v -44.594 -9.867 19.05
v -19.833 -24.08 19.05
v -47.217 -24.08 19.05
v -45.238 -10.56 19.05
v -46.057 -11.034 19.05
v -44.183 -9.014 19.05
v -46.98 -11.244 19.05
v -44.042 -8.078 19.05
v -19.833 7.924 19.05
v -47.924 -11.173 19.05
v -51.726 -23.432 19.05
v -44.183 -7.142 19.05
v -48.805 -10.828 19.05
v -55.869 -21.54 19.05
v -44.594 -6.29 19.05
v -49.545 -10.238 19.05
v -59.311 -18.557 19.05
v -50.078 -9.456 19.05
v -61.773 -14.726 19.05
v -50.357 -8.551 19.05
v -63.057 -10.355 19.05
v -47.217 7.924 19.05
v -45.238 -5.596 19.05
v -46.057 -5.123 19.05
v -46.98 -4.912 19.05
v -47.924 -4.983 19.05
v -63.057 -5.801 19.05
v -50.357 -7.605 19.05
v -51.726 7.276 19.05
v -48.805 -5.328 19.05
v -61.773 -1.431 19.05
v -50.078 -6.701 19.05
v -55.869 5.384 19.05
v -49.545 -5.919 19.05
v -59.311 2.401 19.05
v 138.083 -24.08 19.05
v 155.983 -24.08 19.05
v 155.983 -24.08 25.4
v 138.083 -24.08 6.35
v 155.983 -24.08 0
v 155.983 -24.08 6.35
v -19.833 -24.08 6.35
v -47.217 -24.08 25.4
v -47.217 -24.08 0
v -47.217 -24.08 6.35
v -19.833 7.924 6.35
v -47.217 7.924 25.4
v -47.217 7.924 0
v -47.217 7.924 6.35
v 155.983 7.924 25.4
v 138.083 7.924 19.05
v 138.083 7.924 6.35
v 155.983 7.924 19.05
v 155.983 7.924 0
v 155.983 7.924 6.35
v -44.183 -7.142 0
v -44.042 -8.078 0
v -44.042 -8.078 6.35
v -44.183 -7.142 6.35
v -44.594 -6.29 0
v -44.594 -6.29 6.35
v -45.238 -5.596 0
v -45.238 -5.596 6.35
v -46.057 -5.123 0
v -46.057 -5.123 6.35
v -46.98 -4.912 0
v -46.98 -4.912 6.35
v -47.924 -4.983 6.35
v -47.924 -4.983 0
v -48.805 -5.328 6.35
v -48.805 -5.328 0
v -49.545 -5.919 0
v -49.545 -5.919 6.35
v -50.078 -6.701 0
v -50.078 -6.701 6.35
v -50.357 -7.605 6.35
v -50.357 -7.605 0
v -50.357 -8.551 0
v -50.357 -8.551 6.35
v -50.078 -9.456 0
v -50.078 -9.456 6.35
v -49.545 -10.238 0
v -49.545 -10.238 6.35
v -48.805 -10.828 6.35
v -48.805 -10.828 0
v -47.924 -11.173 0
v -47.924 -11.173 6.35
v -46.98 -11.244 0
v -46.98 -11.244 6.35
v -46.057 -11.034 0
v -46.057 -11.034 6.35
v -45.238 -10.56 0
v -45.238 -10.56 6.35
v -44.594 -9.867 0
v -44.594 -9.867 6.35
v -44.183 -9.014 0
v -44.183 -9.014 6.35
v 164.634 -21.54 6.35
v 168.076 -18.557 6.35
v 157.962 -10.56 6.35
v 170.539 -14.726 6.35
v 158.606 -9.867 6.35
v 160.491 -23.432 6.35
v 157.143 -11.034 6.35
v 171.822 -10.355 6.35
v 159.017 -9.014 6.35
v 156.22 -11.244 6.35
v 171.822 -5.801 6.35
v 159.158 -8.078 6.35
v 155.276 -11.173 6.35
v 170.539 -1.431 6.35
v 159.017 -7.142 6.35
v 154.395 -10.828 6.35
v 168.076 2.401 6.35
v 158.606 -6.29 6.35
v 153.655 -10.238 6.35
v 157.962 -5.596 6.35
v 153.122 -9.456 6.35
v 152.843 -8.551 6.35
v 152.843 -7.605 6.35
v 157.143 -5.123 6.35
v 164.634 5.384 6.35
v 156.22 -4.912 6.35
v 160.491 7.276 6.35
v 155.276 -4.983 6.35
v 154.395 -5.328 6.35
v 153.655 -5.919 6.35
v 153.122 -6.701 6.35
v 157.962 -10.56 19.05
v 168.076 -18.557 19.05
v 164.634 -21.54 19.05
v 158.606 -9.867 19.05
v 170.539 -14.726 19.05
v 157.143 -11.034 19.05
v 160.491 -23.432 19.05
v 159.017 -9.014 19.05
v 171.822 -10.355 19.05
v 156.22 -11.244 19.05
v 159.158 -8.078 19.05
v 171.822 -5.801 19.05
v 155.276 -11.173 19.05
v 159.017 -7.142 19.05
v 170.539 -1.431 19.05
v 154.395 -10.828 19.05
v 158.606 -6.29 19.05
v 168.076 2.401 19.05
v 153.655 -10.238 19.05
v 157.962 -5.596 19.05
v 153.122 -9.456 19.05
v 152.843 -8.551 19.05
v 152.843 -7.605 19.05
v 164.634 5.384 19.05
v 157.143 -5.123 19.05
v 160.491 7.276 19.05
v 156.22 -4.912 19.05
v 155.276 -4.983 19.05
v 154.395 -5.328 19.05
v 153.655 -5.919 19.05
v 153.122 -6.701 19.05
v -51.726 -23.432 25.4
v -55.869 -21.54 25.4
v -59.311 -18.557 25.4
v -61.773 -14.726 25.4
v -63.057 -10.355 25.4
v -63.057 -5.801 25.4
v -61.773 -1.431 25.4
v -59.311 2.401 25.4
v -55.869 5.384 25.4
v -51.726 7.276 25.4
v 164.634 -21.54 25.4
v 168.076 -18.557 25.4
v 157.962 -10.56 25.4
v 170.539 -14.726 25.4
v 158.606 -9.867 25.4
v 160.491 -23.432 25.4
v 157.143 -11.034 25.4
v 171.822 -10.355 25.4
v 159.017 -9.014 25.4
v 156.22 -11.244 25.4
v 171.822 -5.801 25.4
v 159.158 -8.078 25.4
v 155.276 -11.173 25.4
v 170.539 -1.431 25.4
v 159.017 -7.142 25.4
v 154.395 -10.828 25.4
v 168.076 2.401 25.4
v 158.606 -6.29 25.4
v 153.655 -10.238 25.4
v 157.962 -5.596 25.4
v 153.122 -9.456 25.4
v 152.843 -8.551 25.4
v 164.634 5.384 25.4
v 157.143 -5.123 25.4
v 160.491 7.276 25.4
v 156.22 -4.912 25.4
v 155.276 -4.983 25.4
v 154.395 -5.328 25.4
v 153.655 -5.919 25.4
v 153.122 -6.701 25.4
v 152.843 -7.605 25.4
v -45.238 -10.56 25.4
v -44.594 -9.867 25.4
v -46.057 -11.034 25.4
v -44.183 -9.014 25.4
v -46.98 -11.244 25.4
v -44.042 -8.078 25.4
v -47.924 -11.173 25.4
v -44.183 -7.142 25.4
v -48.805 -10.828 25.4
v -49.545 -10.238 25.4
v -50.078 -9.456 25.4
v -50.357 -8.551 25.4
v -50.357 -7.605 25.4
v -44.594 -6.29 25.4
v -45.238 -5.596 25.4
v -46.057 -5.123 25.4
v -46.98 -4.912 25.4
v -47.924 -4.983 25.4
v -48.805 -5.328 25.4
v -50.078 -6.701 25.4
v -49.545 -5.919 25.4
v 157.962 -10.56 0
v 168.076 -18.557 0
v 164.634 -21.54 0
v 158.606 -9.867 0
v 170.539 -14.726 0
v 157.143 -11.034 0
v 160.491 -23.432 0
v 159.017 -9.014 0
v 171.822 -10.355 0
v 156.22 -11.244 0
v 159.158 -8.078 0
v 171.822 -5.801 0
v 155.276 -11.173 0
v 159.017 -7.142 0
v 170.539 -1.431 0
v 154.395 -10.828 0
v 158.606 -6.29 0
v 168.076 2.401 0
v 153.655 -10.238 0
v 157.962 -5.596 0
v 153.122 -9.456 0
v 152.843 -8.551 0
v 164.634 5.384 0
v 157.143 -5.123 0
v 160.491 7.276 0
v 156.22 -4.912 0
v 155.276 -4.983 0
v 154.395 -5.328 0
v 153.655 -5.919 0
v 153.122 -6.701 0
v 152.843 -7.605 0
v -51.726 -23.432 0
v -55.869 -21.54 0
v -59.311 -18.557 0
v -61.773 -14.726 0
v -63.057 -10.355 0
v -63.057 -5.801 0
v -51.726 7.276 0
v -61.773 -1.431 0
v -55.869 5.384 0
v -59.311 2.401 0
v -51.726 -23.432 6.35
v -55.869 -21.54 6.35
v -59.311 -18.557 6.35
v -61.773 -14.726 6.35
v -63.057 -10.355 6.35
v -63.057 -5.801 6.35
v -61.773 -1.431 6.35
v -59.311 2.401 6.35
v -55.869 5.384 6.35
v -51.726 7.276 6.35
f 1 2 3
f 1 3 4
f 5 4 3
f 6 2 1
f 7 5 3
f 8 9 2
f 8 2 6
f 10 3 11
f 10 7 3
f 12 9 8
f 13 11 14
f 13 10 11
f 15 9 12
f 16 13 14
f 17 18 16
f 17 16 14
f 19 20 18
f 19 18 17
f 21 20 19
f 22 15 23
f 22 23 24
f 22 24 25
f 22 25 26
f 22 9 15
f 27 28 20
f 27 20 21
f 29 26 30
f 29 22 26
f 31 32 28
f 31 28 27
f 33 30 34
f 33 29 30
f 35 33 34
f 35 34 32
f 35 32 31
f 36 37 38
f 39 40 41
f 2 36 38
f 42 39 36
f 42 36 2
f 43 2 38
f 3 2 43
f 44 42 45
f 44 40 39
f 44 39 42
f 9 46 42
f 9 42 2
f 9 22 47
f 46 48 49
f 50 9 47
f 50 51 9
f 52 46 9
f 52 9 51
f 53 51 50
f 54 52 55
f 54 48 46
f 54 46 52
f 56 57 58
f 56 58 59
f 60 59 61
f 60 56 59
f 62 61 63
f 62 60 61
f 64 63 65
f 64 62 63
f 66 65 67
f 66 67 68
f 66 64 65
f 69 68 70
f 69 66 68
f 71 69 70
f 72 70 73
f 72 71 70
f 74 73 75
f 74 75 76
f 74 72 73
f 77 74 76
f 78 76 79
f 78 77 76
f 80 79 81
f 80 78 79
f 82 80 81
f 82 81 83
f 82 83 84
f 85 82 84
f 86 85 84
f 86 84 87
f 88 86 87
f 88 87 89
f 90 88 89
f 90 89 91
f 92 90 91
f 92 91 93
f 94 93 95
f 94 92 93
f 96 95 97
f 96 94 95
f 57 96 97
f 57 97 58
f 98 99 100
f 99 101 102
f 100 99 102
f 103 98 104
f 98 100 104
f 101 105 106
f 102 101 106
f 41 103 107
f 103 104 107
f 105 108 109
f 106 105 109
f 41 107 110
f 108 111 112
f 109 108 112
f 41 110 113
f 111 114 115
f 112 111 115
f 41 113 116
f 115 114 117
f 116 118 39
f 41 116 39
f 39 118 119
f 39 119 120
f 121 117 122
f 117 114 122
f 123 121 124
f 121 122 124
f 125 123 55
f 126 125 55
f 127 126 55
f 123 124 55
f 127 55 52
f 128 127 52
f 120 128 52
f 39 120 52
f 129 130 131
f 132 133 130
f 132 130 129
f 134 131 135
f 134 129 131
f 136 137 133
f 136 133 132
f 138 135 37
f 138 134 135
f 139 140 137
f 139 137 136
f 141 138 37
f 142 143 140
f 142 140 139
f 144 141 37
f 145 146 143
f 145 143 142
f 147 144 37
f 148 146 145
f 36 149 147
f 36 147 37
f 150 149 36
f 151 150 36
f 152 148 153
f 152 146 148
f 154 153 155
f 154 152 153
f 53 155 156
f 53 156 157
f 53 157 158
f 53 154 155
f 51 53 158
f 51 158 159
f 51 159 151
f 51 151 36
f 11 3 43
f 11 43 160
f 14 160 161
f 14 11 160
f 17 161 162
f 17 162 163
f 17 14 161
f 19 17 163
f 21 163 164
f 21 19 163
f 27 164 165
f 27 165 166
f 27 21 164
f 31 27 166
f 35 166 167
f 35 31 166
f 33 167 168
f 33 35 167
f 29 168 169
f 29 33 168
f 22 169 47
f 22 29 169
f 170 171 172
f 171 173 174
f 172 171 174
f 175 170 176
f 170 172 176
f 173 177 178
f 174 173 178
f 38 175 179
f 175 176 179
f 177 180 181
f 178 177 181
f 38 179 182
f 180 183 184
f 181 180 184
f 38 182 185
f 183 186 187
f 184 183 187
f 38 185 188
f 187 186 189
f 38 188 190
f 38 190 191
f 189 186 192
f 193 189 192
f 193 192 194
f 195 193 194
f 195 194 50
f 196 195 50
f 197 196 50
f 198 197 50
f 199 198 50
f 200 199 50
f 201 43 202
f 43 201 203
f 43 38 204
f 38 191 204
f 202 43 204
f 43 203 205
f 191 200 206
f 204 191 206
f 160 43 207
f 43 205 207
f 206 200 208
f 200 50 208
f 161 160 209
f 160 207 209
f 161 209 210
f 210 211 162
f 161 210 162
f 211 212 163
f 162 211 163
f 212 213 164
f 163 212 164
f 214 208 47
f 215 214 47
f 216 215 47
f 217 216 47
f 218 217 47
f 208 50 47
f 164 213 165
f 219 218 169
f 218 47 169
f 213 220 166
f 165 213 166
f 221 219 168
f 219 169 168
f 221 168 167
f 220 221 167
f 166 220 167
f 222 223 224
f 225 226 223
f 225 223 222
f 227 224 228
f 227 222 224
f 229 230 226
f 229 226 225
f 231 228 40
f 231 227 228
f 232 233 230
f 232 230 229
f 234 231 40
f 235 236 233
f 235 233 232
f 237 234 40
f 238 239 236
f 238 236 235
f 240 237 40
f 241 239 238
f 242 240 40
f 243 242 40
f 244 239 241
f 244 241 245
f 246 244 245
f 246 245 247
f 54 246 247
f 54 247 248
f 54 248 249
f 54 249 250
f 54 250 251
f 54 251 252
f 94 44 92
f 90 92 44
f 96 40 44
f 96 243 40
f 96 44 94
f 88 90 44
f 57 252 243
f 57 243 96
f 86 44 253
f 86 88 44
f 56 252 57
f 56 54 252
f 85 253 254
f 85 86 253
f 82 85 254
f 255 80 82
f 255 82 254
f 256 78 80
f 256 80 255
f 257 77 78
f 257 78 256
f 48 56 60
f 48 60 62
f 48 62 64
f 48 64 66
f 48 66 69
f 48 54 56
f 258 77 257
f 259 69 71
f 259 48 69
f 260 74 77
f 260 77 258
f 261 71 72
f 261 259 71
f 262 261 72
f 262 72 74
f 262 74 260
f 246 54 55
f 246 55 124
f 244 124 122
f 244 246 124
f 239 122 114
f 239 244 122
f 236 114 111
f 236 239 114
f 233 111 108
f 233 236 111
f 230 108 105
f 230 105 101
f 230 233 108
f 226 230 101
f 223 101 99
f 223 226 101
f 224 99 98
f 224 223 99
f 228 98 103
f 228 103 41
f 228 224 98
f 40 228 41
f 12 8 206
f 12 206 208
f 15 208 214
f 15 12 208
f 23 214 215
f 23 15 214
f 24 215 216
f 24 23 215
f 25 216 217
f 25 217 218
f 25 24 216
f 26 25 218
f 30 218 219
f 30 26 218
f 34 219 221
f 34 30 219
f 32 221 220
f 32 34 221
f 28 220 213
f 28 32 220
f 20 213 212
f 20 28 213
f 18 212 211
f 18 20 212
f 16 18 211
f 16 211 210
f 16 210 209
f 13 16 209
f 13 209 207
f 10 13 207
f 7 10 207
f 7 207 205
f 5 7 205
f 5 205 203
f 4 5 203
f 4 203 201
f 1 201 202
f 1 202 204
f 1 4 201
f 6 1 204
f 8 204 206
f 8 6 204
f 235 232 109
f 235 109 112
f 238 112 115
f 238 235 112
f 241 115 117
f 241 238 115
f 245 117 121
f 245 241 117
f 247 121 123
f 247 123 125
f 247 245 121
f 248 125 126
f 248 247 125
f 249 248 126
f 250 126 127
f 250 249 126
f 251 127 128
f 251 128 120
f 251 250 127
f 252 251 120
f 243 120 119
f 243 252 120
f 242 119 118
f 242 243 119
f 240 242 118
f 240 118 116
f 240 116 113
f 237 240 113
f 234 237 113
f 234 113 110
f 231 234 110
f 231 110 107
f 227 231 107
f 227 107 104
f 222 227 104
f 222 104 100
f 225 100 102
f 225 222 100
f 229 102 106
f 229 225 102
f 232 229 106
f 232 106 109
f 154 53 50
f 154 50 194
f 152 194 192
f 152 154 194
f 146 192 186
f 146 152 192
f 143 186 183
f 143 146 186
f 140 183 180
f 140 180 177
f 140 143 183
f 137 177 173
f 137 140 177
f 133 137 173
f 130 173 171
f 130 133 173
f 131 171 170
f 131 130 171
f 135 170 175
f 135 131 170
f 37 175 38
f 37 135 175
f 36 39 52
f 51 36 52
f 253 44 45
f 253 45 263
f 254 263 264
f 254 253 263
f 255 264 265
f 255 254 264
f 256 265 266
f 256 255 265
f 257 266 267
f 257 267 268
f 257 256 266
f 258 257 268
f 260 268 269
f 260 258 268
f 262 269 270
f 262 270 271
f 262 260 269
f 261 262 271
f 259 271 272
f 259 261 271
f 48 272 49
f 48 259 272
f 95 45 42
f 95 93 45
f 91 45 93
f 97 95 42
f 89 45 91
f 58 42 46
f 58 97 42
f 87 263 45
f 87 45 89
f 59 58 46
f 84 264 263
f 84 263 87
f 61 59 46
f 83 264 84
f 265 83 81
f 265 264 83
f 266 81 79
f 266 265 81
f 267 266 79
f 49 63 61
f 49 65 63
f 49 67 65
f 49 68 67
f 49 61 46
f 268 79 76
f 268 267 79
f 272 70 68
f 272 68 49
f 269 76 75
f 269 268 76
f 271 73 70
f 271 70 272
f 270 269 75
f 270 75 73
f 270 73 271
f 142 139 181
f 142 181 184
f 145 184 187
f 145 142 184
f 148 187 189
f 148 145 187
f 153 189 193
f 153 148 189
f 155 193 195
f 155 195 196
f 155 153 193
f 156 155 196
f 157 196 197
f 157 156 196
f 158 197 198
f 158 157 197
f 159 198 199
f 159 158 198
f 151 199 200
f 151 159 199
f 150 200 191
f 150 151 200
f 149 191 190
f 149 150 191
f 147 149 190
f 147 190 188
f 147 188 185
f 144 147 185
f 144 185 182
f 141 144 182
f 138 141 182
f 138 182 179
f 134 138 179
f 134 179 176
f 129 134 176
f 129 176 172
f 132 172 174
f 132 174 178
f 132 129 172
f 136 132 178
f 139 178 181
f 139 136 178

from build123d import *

# Parameters (mm, degrees)
SKETCH1_R           = 3.175
BOSS_EXTRUDE1_DEPTH = 6.35
SKETCH2_W           = 168.075192403
SKETCH2_H           = 32.004
BOSS_EXTRUDE2_DEPTH = 12.7
SKETCH5_R           = 3.175
BOSS_EXTRUDE3_DEPTH = 6.35
SKETCH7_W           = 12.7
SKETCH7_H           = 32.004
CUT_EXTRUDE1_DEPTH  = 10.16


with BuildPart() as part:
    # Sketch1 → Boss-Extrude1 (new body)
    with BuildSketch(Plane.XY):
        with BuildLine():
            Line((-47.217391304, 7.923913043), (155.982608696, 7.923913043))
            ThreePointArc((155.982608696, 7.923913043), (171.984608696, -8.078086957), (155.982608696, -24.080086957))
            Line((155.982608696, -24.080086957), (-47.217391304, -24.080086957))
            ThreePointArc((-47.217391304, -24.080086957), (-63.219391304, -8.078086957), (-47.217391304, 7.923913043))
        make_face()
        with Locations((-47.217391304, -8.078086957)):
            Circle(SKETCH1_R, mode=Mode.SUBTRACT)
        with Locations((155.982608696, -8.078086957)):
            Circle(SKETCH1_R, mode=Mode.SUBTRACT)
    extrude(amount=BOSS_EXTRUDE1_DEPTH)

    # Sketch2 → Boss-Extrude2 (add)
    with BuildSketch(Plane.XY.offset(6.35)):
        with Locations((54.045012495, -8.078086957)):
            Rectangle(SKETCH2_W, SKETCH2_H)
    extrude(amount=BOSS_EXTRUDE2_DEPTH)

    # Sketch5 → Boss-Extrude3 (add)
    with BuildSketch(Plane.XY.offset(19.05)):
        with BuildLine():
            Line((-47.217391304, 7.923913043), (155.982608696, 7.923913043))
            ThreePointArc((155.982608696, 7.923913043), (171.984608696, -8.078086957), (155.982608696, -24.080086957))
            Line((155.982608696, -24.080086957), (-47.217391304, -24.080086957))
            ThreePointArc((-47.217391304, -24.080086957), (-63.219391304, -8.078086957), (-47.217391304, 7.923913043))
        make_face()
        with Locations((-47.217391304, -8.078086957)):
            Circle(SKETCH5_R, mode=Mode.SUBTRACT)
        with Locations((155.982608696, -8.078086957)):
            Circle(SKETCH5_R, mode=Mode.SUBTRACT)
    extrude(amount=BOSS_EXTRUDE3_DEPTH)

    # Sketch7 → Cut-Extrude1 (cut)
    with BuildSketch(Plane.ZY.offset(29.992583707)):
        with Locations((12.7, -8.078086957)):
            Rectangle(SKETCH7_W, SKETCH7_H)
    extrude(amount=-CUT_EXTRUDE1_DEPTH, mode=Mode.SUBTRACT)


solid = part.part
